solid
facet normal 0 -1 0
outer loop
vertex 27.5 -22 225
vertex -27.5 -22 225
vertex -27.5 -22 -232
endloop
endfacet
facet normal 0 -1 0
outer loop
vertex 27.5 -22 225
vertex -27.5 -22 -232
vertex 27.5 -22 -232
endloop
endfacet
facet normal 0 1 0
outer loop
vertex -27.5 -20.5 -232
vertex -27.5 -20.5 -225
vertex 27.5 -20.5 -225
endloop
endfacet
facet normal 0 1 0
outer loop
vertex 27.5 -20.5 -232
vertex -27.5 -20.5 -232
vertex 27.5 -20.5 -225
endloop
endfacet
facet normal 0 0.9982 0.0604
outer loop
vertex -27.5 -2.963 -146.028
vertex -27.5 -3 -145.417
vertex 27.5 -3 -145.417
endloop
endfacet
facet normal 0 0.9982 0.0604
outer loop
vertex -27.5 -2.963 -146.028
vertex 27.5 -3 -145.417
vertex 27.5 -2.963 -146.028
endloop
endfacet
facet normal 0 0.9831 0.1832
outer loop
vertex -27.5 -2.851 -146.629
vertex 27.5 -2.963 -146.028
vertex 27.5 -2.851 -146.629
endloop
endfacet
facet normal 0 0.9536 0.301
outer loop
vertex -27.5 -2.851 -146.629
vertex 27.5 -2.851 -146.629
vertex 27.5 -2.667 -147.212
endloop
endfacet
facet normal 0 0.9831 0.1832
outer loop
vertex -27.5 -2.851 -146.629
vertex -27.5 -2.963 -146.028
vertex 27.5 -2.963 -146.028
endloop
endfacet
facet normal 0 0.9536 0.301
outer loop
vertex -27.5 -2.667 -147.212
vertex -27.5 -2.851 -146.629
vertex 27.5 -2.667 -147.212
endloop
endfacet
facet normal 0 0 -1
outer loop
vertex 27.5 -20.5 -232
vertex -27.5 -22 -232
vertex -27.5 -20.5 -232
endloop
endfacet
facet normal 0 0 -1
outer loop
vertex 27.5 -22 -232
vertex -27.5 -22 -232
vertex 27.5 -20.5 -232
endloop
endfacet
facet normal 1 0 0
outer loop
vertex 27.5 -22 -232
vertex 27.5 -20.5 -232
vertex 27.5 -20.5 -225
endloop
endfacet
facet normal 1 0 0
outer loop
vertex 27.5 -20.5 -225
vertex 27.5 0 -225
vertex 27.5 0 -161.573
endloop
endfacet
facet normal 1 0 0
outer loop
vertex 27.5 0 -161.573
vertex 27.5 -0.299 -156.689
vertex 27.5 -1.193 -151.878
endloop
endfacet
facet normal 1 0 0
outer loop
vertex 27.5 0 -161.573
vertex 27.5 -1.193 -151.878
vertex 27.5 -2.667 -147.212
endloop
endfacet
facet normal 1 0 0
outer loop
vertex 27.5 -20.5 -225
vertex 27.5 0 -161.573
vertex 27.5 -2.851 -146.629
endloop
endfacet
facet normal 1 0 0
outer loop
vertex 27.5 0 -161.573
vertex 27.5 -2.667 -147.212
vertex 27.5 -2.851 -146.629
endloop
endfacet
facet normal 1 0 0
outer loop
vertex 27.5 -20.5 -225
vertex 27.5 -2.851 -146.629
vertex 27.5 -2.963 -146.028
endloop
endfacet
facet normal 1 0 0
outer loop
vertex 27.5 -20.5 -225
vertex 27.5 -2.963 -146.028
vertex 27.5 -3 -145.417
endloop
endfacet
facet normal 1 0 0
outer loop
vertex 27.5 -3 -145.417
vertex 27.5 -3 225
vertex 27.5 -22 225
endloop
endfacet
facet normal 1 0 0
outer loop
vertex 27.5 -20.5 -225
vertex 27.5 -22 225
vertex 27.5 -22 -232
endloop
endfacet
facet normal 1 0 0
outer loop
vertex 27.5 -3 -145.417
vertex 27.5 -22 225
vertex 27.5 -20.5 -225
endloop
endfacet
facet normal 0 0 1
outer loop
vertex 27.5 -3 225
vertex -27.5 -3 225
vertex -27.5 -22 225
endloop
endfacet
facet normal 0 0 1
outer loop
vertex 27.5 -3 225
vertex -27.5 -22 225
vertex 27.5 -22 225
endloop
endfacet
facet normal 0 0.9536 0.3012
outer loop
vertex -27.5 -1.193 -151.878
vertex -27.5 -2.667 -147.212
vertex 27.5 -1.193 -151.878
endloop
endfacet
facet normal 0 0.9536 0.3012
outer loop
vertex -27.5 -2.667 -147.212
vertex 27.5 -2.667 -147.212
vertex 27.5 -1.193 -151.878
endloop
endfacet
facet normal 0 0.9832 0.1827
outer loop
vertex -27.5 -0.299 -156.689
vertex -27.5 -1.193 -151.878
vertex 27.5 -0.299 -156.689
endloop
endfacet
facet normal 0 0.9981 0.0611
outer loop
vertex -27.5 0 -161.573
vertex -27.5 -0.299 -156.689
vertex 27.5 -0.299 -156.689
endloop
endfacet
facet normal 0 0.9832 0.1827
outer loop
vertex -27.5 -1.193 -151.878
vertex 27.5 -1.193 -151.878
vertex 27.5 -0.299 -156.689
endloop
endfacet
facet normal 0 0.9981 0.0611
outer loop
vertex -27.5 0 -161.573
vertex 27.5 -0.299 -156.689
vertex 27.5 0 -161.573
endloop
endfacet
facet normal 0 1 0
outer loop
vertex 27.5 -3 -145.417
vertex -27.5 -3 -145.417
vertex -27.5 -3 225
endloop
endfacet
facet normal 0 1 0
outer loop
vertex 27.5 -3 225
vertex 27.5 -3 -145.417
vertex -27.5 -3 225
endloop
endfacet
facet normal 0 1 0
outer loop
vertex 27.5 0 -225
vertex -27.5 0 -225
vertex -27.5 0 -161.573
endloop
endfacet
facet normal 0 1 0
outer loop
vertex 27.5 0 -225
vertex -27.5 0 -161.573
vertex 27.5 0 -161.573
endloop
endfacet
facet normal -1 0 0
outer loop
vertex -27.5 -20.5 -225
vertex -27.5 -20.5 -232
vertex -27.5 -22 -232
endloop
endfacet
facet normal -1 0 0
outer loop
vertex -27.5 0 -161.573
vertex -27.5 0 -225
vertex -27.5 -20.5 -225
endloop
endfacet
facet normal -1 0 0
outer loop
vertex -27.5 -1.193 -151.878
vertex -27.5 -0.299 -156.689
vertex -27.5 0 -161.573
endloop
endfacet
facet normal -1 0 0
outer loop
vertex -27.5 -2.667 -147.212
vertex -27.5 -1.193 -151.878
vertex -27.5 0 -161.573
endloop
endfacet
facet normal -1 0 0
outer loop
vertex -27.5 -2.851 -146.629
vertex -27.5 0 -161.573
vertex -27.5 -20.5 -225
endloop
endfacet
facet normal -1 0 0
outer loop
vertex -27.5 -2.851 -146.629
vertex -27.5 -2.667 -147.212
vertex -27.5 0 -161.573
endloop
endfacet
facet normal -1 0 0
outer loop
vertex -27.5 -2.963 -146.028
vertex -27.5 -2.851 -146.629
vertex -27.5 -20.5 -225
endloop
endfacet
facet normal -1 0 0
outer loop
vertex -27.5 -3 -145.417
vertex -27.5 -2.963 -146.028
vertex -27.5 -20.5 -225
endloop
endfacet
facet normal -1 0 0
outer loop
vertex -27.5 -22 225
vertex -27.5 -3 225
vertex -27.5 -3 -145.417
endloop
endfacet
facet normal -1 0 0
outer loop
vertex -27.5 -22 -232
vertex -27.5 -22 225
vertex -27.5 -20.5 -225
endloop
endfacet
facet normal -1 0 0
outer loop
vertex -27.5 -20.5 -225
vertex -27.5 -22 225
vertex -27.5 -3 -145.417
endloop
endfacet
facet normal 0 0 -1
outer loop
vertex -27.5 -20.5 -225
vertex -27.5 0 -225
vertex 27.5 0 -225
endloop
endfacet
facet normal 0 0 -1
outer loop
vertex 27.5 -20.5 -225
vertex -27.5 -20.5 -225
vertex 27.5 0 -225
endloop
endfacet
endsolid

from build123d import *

# Parameters (mm, degrees)
F0_W        = 55
F0_H        = 450
F1_DEPTH    = 22
F2_W        = 55
F2_H        = 1.5
F3_DEPTH    = 7
F4_W        = 3
F4_H        = 375
F5_DEPTH    = 55.001
F6_T1_DEPTH = 55
F7_R        = 40


# Not quite as in the source:
# - a fillet or chamfer that OpenCascade refuses, or shapes differently, is made with other operations: its cross-section is extruded or revolved along the edge and cut away or added


with BuildPart() as f1:
    # F0 (on Front) → F1 (new body)
    with BuildSketch(Plane.XZ):
        Rectangle(F0_W, F0_H)
    extrude(amount=F1_DEPTH)

    # F2 (on face) → F3 (join)
    with BuildSketch(Plane(origin=(0, 0, -225), x_dir=(1, 0, 0), z_dir=(0, 0, -1))):
        with Locations((0, 21.25)):
            Rectangle(F2_W, F2_H)
    extrude(amount=F3_DEPTH)

    # F4 (on face) → F5 (cut, through all)
    with BuildSketch(Plane(origin=(-27.5, 0, 0), x_dir=(0, -1, 0), z_dir=(-1, 0, 0))):
        with Locations((1.5, 37.5)):
            Rectangle(F4_W, F4_H)
    extrude(amount=-F5_DEPTH, mode=Mode.SUBTRACT)

    # F6: fillet of radius 5 on 1 edges, made by hand

    # F6_s2 → F6_t1 (join)
    with BuildSketch(Plane.YZ.offset(-27.5)):
        with BuildLine():
            ThreePointArc((-3, -145.417424305), (-2.1833001327, -148.1560370926), (0, -150))
            Line((0, -150), (-3, -150))
            Line((-3, -150), (-3, -145.417424305))
        make_face()
    extrude(amount=F6_T1_DEPTH)

    # F7
    f7_edges = [f1.edges().sort_by_distance(p)[0] for p in [
        (0, 0, -150),
    ]]
    fillet(f7_edges, radius=F7_R)


solid = f1.part
